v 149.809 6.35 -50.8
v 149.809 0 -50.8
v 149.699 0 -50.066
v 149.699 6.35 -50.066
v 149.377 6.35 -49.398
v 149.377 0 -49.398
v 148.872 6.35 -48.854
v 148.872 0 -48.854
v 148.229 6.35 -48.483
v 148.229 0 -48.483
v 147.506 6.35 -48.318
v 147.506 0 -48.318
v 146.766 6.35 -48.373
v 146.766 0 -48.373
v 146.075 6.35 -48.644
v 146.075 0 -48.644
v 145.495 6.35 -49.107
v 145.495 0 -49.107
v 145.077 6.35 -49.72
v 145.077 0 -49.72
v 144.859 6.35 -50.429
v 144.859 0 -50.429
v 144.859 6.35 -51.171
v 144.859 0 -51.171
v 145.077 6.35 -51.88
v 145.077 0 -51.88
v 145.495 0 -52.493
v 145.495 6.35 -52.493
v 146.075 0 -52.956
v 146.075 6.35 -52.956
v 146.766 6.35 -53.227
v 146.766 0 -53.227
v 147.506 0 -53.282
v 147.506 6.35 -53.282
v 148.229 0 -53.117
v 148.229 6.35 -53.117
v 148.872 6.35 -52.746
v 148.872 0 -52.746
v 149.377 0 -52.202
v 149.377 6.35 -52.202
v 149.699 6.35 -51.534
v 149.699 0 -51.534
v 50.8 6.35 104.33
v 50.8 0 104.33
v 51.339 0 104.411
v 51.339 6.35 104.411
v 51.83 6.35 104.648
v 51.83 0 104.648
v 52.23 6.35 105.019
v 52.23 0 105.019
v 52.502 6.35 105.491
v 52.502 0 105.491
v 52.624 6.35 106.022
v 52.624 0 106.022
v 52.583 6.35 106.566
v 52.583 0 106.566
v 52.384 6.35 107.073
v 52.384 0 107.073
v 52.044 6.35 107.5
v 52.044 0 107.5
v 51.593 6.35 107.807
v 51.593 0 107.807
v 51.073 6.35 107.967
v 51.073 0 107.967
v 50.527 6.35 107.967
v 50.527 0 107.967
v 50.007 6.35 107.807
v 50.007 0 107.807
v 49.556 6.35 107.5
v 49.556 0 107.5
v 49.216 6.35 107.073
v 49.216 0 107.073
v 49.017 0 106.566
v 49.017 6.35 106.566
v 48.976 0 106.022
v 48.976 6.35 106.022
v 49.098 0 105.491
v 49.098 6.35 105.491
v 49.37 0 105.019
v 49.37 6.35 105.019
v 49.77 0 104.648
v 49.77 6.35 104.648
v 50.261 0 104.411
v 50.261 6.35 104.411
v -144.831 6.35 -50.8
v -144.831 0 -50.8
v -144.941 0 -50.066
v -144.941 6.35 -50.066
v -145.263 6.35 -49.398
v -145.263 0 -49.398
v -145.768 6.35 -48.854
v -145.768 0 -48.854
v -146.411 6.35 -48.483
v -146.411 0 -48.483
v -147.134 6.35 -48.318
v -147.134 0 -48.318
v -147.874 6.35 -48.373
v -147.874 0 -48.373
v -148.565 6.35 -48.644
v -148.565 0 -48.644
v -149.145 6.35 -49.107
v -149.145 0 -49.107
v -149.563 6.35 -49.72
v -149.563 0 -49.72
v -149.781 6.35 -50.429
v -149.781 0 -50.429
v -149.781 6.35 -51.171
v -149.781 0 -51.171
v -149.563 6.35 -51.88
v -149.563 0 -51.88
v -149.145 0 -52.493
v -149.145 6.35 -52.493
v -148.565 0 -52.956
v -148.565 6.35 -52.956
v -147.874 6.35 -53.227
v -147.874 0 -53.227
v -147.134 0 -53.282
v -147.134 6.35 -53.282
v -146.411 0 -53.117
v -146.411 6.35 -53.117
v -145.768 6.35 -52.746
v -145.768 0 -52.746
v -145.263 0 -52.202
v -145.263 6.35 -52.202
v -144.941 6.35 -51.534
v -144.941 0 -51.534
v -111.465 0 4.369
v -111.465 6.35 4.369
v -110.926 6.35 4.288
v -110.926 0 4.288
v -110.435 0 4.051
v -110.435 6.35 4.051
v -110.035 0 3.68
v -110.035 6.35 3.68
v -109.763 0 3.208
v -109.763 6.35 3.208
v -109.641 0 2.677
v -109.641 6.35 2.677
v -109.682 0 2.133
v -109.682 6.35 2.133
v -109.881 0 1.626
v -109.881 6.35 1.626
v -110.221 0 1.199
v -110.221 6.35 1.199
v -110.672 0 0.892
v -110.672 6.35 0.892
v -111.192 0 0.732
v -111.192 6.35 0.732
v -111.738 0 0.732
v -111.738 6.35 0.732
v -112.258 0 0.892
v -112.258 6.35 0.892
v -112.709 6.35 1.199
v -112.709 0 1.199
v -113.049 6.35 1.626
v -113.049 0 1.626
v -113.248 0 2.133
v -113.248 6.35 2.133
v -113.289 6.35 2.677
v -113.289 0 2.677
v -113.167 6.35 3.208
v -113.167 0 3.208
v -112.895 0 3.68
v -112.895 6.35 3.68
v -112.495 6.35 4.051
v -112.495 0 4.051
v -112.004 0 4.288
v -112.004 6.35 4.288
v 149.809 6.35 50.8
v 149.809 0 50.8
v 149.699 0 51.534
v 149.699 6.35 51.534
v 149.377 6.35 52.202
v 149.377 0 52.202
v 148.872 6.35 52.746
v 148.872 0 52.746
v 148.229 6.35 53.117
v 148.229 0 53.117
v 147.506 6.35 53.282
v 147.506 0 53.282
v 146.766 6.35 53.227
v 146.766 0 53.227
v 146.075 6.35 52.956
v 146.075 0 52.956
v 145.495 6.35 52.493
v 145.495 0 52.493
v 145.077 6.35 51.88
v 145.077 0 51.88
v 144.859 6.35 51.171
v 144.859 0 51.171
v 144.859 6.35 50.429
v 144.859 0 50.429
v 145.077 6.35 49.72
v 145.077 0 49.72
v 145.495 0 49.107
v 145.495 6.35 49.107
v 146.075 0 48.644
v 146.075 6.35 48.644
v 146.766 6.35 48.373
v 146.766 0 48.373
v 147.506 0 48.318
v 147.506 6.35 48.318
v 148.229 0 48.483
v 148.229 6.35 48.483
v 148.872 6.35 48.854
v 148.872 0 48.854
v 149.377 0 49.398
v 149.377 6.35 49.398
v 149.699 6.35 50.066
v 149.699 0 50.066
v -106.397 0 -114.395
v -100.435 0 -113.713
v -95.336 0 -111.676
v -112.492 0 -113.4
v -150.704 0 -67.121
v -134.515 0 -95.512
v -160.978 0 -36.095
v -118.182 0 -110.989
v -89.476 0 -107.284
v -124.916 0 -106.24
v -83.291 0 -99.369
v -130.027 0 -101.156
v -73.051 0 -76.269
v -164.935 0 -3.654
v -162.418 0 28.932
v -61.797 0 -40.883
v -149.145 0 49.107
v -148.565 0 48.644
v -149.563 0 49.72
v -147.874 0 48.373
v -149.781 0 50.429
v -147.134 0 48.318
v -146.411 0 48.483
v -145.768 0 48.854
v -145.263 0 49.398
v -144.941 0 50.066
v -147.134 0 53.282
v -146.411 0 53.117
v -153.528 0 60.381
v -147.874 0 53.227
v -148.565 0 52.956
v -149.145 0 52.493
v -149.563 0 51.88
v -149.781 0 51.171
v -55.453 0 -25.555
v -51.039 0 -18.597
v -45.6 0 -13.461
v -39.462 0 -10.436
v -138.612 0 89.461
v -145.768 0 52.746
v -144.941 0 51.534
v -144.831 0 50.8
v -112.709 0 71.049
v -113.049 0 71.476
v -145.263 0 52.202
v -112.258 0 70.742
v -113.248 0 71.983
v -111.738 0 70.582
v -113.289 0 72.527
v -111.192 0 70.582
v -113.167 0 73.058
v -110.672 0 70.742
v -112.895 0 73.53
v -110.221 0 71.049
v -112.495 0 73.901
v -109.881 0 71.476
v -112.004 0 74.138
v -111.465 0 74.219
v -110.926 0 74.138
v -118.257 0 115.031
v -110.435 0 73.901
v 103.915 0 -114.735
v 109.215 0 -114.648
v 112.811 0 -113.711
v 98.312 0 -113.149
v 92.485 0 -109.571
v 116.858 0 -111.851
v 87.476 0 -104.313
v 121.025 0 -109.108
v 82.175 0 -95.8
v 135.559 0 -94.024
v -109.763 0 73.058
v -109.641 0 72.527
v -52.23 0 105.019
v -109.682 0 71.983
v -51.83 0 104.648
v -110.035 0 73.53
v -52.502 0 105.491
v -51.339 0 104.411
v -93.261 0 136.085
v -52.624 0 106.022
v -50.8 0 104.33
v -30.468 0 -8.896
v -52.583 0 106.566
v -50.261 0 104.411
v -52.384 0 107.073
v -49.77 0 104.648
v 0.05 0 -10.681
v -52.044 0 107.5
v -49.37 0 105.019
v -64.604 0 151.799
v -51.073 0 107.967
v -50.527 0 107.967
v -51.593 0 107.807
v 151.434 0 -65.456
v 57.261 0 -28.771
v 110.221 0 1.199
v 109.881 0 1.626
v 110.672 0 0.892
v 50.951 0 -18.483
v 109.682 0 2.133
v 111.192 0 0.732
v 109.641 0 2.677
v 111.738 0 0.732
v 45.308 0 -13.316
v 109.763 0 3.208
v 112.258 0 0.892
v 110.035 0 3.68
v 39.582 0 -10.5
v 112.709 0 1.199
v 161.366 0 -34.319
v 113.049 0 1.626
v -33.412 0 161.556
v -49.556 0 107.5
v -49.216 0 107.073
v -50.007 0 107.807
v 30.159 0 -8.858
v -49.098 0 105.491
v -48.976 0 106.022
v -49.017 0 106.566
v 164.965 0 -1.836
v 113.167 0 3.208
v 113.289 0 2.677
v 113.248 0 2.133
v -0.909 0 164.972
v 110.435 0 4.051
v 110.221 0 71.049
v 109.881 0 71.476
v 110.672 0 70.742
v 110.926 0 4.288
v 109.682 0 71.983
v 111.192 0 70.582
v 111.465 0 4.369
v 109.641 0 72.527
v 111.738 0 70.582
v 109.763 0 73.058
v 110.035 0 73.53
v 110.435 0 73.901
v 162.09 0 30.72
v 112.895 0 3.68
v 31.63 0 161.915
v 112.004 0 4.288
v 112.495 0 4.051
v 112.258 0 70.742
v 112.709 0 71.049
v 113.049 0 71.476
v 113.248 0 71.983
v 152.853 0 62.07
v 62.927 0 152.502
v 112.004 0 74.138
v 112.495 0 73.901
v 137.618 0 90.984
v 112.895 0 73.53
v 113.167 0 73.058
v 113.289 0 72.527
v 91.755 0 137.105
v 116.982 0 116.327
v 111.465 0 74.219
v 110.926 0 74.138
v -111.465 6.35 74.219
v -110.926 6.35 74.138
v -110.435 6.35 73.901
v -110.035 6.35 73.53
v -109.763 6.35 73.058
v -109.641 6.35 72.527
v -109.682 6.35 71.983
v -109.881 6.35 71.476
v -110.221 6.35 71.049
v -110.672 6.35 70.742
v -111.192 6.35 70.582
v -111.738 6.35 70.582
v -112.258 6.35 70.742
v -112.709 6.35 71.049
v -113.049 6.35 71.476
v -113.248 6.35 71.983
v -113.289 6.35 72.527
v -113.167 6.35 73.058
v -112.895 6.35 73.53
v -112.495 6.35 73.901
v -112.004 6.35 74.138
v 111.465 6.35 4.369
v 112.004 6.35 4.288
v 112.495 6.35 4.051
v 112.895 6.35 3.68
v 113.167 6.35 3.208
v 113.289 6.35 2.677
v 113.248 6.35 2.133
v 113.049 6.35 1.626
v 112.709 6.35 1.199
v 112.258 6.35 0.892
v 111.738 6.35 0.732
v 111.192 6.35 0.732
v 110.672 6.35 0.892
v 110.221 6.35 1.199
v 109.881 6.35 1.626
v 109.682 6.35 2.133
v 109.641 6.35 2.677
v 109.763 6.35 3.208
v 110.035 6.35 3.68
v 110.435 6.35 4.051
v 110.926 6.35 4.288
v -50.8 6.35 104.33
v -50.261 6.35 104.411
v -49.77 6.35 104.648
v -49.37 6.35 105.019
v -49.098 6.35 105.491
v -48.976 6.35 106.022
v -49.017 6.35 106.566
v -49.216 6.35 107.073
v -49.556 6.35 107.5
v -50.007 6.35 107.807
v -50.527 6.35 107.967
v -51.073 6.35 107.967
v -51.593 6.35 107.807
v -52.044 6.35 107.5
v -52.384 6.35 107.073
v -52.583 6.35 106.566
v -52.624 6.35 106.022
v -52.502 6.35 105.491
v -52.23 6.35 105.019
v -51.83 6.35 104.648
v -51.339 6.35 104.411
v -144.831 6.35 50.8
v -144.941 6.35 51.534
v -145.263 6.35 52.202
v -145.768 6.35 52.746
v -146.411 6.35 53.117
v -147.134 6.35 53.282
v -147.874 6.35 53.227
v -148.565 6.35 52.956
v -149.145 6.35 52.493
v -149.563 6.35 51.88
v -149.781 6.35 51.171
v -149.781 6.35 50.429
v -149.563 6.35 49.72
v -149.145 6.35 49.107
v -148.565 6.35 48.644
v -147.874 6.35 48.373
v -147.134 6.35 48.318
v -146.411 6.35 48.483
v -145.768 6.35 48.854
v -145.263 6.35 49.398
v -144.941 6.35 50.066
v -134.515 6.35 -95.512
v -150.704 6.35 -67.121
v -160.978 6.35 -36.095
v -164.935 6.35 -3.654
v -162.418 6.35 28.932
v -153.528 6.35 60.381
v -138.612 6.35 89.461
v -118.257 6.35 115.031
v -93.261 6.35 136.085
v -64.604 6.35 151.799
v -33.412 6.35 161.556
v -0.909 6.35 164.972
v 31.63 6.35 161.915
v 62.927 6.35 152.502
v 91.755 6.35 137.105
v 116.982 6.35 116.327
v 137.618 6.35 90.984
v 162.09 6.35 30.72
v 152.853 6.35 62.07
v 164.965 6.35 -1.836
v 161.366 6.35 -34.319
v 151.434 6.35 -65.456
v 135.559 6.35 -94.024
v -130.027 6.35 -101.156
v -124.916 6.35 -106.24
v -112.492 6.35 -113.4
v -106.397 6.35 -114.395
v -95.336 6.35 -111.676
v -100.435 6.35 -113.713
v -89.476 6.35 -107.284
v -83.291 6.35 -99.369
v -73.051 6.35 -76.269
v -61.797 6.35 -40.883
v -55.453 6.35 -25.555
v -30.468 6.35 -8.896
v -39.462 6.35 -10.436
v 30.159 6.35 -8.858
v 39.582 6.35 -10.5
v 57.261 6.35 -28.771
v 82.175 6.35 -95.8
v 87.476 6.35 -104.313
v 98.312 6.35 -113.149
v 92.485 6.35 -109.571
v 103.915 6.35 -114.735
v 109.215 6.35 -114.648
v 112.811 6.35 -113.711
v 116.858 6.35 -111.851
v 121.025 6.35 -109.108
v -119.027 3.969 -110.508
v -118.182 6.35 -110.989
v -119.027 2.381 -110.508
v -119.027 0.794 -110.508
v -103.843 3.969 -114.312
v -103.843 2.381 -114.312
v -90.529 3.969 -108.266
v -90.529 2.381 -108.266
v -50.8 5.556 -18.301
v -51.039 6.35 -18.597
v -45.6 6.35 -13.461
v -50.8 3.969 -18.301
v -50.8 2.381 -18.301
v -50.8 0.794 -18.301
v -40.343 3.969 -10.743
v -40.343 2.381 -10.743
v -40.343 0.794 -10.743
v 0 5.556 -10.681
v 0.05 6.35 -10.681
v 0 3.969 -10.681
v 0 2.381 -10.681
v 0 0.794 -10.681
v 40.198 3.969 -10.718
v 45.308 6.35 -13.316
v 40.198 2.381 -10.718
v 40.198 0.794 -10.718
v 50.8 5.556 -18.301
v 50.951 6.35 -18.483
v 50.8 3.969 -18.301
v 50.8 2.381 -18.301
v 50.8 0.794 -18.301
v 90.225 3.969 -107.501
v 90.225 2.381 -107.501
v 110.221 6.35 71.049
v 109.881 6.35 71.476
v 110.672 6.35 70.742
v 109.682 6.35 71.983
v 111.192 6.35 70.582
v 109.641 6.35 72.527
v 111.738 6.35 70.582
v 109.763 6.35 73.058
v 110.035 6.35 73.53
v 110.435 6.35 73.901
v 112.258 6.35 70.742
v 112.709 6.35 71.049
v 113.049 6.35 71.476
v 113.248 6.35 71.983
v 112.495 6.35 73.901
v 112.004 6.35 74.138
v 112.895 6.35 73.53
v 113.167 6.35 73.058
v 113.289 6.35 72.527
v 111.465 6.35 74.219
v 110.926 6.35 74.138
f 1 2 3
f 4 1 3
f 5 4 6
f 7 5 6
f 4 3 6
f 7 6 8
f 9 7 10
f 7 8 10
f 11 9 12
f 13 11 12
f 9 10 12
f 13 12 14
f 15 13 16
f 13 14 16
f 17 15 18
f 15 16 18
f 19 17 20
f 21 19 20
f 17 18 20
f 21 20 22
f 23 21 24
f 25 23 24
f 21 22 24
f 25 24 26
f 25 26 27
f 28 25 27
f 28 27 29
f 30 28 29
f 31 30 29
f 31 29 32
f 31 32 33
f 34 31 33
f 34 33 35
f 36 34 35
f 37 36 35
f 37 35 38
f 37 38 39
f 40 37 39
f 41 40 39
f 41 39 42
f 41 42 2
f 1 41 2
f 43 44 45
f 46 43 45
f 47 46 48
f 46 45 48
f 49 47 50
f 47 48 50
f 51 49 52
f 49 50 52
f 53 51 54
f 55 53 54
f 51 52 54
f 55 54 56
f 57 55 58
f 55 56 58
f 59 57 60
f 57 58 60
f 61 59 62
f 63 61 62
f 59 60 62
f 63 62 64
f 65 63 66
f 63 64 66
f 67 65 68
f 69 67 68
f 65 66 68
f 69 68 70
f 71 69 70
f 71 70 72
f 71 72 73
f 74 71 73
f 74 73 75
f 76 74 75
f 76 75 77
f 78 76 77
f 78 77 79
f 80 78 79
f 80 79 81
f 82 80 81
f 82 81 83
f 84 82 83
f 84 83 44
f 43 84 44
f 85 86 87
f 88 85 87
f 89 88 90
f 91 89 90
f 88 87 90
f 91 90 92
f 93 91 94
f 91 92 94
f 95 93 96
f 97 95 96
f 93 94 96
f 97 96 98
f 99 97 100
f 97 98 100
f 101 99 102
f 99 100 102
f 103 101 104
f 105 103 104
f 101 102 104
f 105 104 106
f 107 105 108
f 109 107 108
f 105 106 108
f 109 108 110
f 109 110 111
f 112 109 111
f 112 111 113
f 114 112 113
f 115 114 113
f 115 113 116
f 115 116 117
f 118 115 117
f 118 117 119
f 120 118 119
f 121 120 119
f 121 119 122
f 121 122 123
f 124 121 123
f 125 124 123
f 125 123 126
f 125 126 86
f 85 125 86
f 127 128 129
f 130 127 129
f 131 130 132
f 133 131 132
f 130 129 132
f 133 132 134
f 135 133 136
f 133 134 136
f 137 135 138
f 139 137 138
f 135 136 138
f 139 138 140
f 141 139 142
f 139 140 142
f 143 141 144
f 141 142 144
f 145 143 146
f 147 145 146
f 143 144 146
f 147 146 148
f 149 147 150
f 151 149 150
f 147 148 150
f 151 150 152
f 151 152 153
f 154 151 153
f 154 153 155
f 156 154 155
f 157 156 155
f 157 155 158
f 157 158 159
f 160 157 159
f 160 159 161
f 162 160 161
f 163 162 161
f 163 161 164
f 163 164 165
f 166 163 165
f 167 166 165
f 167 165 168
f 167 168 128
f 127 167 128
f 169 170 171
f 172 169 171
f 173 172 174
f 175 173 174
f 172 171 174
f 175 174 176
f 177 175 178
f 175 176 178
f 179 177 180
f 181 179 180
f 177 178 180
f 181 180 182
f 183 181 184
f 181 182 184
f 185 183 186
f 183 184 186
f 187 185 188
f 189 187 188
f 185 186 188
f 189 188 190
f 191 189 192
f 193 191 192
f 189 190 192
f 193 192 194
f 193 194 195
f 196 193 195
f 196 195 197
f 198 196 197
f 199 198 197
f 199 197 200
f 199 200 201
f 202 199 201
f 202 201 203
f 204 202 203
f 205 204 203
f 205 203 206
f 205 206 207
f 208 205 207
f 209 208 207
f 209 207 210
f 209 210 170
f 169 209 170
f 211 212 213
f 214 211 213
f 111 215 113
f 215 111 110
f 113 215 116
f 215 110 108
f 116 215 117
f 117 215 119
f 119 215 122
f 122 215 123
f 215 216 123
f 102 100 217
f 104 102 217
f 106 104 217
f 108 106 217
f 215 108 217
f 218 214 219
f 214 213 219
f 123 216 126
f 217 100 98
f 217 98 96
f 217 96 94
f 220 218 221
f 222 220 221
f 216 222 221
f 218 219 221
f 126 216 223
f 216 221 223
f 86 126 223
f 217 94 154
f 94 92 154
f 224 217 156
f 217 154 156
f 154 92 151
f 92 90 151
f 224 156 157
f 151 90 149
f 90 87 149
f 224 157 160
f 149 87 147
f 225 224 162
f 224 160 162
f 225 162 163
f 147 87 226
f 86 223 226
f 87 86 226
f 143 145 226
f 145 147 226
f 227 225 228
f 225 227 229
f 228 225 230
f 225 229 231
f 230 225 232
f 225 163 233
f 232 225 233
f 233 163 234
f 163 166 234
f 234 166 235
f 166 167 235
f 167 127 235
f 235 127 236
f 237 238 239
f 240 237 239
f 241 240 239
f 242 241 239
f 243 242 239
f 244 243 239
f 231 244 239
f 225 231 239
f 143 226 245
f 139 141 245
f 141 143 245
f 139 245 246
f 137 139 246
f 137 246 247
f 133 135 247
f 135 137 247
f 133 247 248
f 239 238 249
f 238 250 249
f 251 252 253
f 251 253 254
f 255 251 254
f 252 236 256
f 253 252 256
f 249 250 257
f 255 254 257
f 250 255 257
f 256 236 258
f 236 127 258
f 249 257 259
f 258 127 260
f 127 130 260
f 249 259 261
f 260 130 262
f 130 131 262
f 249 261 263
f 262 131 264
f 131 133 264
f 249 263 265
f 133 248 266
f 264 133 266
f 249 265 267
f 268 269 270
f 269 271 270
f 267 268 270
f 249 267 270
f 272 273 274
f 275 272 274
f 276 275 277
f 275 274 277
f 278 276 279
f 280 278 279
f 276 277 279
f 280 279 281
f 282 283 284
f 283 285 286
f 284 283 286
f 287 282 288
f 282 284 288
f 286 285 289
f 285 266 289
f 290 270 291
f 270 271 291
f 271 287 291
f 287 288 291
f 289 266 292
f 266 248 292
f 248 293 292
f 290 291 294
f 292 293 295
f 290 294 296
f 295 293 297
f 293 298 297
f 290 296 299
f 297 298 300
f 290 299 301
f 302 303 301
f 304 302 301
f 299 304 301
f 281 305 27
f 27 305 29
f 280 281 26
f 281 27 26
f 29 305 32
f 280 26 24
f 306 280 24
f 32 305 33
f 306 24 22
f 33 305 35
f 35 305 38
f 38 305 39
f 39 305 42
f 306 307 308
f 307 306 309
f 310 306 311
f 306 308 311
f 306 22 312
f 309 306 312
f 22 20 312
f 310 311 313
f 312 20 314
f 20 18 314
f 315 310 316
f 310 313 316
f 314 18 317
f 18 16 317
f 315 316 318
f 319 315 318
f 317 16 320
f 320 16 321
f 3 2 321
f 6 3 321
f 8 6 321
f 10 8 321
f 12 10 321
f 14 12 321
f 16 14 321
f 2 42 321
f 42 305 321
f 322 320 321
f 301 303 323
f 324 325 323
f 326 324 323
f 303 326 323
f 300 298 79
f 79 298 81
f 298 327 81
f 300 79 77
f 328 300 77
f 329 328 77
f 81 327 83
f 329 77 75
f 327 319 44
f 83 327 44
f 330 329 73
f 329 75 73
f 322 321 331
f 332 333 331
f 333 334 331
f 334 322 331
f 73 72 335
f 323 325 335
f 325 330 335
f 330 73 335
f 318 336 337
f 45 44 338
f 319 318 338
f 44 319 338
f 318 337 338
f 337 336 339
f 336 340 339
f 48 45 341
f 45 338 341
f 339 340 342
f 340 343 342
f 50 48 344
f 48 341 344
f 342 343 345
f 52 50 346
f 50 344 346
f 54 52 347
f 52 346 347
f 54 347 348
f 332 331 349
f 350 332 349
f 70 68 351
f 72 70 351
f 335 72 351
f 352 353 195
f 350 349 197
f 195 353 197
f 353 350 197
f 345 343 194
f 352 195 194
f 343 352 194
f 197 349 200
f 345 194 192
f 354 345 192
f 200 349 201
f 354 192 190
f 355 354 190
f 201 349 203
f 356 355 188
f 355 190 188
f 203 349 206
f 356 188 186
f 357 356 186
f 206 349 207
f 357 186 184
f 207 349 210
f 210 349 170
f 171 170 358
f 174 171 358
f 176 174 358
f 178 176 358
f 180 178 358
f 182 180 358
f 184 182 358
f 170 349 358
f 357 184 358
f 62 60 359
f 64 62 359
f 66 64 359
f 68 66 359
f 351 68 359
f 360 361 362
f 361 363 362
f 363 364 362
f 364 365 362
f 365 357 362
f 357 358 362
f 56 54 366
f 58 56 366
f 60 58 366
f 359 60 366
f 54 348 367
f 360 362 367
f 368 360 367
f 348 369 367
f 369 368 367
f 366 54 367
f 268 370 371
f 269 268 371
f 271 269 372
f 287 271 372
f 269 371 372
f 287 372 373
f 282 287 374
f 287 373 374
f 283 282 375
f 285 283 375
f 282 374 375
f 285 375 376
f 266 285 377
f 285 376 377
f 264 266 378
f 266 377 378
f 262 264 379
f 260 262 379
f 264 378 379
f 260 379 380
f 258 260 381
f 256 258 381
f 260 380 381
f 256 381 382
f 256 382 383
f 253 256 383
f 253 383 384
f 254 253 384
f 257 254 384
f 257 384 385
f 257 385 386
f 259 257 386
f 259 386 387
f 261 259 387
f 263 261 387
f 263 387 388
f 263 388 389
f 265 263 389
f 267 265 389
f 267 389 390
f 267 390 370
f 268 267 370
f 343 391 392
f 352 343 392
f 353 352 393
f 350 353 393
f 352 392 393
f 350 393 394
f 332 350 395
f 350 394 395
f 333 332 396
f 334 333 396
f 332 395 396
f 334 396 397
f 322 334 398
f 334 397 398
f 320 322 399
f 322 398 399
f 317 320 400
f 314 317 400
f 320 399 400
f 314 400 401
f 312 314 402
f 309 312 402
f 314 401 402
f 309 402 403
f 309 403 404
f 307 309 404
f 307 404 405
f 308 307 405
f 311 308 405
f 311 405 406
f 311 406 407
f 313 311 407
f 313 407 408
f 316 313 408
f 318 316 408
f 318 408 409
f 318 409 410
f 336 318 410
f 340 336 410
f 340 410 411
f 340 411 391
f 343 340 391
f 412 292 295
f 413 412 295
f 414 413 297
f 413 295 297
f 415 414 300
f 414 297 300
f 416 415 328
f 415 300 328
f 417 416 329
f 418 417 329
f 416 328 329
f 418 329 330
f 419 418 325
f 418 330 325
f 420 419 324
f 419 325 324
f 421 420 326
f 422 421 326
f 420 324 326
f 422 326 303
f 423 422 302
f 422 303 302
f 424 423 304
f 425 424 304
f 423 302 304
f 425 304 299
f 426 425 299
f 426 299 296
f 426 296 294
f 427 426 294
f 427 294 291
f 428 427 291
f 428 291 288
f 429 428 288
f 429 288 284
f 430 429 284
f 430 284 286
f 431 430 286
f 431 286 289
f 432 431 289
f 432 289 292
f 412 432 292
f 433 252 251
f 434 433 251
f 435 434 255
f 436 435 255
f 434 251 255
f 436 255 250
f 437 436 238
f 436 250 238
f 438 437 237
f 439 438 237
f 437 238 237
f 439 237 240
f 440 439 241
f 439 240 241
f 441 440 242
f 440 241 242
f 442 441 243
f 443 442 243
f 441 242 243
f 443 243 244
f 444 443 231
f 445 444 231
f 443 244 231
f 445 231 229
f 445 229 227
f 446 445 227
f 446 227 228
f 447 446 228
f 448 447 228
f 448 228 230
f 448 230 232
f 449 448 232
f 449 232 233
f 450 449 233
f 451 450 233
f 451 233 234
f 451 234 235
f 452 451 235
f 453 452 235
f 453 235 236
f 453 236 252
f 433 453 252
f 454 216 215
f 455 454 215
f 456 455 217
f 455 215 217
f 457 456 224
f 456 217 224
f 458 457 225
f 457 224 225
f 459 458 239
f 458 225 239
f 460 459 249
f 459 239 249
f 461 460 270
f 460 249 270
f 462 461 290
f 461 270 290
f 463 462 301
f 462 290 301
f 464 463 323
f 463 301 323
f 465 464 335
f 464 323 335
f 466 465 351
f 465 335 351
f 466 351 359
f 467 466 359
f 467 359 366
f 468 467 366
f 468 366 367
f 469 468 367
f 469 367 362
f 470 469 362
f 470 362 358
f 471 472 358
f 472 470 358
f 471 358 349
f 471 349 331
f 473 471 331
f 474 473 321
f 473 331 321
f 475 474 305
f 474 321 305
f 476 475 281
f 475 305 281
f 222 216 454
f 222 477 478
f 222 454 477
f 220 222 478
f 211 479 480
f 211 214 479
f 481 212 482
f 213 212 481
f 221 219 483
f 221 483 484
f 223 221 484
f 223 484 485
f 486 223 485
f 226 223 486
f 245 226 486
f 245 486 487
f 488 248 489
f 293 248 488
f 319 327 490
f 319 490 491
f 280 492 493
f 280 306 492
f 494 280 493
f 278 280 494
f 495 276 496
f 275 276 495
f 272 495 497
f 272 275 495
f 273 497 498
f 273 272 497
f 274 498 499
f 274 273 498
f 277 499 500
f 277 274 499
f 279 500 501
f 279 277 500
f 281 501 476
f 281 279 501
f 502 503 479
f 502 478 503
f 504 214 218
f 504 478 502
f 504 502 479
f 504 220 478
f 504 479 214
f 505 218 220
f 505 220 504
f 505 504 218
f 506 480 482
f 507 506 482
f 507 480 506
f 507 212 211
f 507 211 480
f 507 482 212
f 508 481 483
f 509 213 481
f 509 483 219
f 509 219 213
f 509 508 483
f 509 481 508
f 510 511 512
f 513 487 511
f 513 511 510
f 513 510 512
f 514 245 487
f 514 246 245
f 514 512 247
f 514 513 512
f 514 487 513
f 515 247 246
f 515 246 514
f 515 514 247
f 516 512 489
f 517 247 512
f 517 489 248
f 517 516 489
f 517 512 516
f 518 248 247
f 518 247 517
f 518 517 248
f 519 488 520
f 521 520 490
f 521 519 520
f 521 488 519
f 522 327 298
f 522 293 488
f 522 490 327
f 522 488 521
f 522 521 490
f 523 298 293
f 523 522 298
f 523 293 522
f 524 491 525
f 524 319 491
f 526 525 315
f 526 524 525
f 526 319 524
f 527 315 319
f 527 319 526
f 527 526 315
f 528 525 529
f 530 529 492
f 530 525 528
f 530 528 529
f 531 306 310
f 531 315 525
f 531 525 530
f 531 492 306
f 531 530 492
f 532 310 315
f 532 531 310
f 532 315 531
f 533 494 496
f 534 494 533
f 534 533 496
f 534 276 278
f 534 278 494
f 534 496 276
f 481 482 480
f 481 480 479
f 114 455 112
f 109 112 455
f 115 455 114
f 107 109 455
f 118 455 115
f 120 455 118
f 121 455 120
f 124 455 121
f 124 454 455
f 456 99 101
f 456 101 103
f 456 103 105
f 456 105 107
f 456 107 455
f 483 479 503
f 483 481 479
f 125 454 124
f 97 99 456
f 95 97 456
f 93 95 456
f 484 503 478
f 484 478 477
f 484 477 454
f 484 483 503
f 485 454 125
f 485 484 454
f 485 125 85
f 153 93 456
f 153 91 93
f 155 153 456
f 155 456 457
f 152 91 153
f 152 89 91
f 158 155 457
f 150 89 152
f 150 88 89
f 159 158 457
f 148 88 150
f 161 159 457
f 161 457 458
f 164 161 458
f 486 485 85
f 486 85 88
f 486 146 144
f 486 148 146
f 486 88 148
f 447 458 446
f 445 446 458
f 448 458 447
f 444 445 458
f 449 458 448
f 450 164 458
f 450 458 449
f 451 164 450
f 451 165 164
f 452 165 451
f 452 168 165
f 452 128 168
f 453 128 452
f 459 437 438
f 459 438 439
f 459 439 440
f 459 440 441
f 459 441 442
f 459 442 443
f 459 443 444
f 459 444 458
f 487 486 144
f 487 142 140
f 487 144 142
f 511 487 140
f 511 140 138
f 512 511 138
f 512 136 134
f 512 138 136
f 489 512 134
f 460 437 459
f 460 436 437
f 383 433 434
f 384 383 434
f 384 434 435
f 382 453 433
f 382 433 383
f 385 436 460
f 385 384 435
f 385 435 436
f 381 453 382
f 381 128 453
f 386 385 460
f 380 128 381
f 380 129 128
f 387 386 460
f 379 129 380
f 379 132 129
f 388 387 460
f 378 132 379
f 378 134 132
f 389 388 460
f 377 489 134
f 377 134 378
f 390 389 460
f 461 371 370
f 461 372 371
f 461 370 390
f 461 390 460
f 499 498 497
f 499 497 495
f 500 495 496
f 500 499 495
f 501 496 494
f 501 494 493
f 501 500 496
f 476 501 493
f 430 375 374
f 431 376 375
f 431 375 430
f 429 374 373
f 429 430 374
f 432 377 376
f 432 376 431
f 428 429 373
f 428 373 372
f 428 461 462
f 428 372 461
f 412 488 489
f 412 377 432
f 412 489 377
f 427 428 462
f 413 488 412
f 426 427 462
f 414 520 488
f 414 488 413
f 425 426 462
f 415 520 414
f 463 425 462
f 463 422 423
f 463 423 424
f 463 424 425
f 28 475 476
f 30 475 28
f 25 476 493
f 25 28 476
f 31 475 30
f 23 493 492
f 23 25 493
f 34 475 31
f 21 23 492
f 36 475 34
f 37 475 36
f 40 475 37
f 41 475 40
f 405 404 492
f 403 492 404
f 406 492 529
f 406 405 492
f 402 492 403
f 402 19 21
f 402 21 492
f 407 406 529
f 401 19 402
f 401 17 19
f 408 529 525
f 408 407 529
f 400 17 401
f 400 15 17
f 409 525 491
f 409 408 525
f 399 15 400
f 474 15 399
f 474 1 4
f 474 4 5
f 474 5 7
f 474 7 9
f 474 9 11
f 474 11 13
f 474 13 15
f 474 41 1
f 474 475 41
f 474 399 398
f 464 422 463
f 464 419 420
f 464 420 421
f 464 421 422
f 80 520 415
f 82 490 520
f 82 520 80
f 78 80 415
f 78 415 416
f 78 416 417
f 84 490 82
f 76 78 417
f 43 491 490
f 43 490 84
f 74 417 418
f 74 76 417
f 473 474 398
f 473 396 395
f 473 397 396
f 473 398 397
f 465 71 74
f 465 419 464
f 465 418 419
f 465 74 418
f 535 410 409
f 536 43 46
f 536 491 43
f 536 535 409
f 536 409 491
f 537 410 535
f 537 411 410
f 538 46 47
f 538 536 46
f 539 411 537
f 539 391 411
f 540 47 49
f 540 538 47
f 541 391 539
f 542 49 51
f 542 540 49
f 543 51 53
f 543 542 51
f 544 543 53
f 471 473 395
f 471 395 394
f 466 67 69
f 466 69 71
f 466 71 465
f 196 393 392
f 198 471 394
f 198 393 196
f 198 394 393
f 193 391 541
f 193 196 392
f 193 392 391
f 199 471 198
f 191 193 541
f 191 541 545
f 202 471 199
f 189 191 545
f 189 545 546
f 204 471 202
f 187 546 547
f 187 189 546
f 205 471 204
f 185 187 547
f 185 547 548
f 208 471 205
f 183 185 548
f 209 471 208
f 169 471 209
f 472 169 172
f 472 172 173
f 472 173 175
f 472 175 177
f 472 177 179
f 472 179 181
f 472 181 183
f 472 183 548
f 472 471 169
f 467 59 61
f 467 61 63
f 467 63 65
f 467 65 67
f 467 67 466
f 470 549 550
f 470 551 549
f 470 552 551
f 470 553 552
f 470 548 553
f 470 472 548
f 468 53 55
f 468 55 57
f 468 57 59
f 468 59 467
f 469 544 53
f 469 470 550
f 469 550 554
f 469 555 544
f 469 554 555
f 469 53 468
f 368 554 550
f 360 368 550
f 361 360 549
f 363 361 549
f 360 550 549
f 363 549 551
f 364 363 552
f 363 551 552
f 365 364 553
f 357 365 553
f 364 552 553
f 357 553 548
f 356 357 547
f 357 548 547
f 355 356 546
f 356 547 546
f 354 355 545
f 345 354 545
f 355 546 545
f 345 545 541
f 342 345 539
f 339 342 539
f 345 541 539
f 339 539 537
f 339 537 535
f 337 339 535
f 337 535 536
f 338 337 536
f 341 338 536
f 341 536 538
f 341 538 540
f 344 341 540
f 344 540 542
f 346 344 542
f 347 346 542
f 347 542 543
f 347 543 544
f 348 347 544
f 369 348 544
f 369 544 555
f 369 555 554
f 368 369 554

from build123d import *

# Parameters (mm, degrees)
SKETCH1_R                 = 164.975
BOSS_EXTRUDE1_DEPTH       = 6.35
F_6_CLEARANCE_HOLE1_D     = 3.6576
CUT_EXTRUDE1_DEPTH        = 234.396280497
CUT_EXTRUDE1_DEPTH_BACK   = 234.396280497
F_6_CLEARANCE_HOLE2_D     = 3.6576
F_6_CLEARANCE_HOLE2_DEPTH = 25.4
F_6_CLEARANCE_HOLE2_TIP   = 1.0988539
F_10_CLEARANCE_HOLE3_D    = 4.9784


with BuildPart() as part:
    # Sketch1 → Boss-Extrude1 (new body)
    with BuildSketch(Plane(origin=(0, 0, 0), x_dir=(1, 0, 0), z_dir=(0, 1, 0))):
        with Locations(Location((0, 0, 0), (0, 0, 270))):
            Circle(SKETCH1_R)
    extrude(amount=BOSS_EXTRUDE1_DEPTH)

    # #6 Clearance Hole1 (through all)
    with Locations(Plane(origin=(111.465, 0, 2.54), x_dir=(0, 0, -1), z_dir=(0, -1, 0))):
        with Locations((0, 0), (-69.85, 0), (-69.85, -222.93), (0, -222.93)):
            Hole(F_6_CLEARANCE_HOLE1_D / 2)

    # Sketch4 → Cut-Extrude1 (cut, two sides: drawn at the far end of the back side and taken through both)
    with BuildSketch(Plane(origin=(0, 6.35, 0), x_dir=(1, 0, 0), z_dir=(0, 1, 0)).offset(-CUT_EXTRUDE1_DEPTH_BACK)):
        with BuildLine():
            ThreePointArc((135.559273802, 94.023581677), (0.909023753, 164.972495589), (-134.514905155, 95.511731825))
            add(Edge.make_bspline(
                [(-134.514905155, 95.511731825), (-123.099313746, 111.400768261), (-106.148892425, 118.406504162), (-71.390187055, 97.759614567), (-62.101610339, -5.971047897), (0.172013059, 18.183800686), (61.336165132, -6.05350297), (73.495013895, 97.95601073), (105.334247953, 118.220752119), (120.053727673, 114.006940105), (135.559273802, 94.023581677)],
                knots=[0.002873593, 0.002873593, 0.002873593, 0.002873593, 0.096822713, 0.130284198, 0.334614856, 0.50142049, 0.668226124, 0.872556782, 0.905734169, 1, 1, 1, 1], degree=3))
        make_face()
    extrude(amount=CUT_EXTRUDE1_DEPTH + CUT_EXTRUDE1_DEPTH_BACK, mode=Mode.SUBTRACT)

    # #6 Clearance Hole2
    with Locations(Plane(origin=(50.8, 6.35, 106.158945667), x_dir=(0, 0, 1), z_dir=(0, 1, 0))):
        with Locations((0, 0), (0, -101.6)):
            Hole(F_6_CLEARANCE_HOLE2_D / 2, depth=F_6_CLEARANCE_HOLE2_DEPTH)
            with Locations((0, 0, -(F_6_CLEARANCE_HOLE2_DEPTH + F_6_CLEARANCE_HOLE2_TIP / 2))):  # 118° drill point
                Cone(0, F_6_CLEARANCE_HOLE2_D / 2, F_6_CLEARANCE_HOLE2_TIP, mode=Mode.SUBTRACT)

    # #10 Clearance Hole3 (through all)
    with Locations(Plane(origin=(0, 6.35, 0), x_dir=(-1, 0, 0), z_dir=(0, 1, 0))):
        with Locations((147.32, -50.8), (147.32, 50.8), (-147.32, -50.8), (-147.32, 50.8)):
            Hole(F_10_CLEARANCE_HOLE3_D / 2)


solid = part.part
